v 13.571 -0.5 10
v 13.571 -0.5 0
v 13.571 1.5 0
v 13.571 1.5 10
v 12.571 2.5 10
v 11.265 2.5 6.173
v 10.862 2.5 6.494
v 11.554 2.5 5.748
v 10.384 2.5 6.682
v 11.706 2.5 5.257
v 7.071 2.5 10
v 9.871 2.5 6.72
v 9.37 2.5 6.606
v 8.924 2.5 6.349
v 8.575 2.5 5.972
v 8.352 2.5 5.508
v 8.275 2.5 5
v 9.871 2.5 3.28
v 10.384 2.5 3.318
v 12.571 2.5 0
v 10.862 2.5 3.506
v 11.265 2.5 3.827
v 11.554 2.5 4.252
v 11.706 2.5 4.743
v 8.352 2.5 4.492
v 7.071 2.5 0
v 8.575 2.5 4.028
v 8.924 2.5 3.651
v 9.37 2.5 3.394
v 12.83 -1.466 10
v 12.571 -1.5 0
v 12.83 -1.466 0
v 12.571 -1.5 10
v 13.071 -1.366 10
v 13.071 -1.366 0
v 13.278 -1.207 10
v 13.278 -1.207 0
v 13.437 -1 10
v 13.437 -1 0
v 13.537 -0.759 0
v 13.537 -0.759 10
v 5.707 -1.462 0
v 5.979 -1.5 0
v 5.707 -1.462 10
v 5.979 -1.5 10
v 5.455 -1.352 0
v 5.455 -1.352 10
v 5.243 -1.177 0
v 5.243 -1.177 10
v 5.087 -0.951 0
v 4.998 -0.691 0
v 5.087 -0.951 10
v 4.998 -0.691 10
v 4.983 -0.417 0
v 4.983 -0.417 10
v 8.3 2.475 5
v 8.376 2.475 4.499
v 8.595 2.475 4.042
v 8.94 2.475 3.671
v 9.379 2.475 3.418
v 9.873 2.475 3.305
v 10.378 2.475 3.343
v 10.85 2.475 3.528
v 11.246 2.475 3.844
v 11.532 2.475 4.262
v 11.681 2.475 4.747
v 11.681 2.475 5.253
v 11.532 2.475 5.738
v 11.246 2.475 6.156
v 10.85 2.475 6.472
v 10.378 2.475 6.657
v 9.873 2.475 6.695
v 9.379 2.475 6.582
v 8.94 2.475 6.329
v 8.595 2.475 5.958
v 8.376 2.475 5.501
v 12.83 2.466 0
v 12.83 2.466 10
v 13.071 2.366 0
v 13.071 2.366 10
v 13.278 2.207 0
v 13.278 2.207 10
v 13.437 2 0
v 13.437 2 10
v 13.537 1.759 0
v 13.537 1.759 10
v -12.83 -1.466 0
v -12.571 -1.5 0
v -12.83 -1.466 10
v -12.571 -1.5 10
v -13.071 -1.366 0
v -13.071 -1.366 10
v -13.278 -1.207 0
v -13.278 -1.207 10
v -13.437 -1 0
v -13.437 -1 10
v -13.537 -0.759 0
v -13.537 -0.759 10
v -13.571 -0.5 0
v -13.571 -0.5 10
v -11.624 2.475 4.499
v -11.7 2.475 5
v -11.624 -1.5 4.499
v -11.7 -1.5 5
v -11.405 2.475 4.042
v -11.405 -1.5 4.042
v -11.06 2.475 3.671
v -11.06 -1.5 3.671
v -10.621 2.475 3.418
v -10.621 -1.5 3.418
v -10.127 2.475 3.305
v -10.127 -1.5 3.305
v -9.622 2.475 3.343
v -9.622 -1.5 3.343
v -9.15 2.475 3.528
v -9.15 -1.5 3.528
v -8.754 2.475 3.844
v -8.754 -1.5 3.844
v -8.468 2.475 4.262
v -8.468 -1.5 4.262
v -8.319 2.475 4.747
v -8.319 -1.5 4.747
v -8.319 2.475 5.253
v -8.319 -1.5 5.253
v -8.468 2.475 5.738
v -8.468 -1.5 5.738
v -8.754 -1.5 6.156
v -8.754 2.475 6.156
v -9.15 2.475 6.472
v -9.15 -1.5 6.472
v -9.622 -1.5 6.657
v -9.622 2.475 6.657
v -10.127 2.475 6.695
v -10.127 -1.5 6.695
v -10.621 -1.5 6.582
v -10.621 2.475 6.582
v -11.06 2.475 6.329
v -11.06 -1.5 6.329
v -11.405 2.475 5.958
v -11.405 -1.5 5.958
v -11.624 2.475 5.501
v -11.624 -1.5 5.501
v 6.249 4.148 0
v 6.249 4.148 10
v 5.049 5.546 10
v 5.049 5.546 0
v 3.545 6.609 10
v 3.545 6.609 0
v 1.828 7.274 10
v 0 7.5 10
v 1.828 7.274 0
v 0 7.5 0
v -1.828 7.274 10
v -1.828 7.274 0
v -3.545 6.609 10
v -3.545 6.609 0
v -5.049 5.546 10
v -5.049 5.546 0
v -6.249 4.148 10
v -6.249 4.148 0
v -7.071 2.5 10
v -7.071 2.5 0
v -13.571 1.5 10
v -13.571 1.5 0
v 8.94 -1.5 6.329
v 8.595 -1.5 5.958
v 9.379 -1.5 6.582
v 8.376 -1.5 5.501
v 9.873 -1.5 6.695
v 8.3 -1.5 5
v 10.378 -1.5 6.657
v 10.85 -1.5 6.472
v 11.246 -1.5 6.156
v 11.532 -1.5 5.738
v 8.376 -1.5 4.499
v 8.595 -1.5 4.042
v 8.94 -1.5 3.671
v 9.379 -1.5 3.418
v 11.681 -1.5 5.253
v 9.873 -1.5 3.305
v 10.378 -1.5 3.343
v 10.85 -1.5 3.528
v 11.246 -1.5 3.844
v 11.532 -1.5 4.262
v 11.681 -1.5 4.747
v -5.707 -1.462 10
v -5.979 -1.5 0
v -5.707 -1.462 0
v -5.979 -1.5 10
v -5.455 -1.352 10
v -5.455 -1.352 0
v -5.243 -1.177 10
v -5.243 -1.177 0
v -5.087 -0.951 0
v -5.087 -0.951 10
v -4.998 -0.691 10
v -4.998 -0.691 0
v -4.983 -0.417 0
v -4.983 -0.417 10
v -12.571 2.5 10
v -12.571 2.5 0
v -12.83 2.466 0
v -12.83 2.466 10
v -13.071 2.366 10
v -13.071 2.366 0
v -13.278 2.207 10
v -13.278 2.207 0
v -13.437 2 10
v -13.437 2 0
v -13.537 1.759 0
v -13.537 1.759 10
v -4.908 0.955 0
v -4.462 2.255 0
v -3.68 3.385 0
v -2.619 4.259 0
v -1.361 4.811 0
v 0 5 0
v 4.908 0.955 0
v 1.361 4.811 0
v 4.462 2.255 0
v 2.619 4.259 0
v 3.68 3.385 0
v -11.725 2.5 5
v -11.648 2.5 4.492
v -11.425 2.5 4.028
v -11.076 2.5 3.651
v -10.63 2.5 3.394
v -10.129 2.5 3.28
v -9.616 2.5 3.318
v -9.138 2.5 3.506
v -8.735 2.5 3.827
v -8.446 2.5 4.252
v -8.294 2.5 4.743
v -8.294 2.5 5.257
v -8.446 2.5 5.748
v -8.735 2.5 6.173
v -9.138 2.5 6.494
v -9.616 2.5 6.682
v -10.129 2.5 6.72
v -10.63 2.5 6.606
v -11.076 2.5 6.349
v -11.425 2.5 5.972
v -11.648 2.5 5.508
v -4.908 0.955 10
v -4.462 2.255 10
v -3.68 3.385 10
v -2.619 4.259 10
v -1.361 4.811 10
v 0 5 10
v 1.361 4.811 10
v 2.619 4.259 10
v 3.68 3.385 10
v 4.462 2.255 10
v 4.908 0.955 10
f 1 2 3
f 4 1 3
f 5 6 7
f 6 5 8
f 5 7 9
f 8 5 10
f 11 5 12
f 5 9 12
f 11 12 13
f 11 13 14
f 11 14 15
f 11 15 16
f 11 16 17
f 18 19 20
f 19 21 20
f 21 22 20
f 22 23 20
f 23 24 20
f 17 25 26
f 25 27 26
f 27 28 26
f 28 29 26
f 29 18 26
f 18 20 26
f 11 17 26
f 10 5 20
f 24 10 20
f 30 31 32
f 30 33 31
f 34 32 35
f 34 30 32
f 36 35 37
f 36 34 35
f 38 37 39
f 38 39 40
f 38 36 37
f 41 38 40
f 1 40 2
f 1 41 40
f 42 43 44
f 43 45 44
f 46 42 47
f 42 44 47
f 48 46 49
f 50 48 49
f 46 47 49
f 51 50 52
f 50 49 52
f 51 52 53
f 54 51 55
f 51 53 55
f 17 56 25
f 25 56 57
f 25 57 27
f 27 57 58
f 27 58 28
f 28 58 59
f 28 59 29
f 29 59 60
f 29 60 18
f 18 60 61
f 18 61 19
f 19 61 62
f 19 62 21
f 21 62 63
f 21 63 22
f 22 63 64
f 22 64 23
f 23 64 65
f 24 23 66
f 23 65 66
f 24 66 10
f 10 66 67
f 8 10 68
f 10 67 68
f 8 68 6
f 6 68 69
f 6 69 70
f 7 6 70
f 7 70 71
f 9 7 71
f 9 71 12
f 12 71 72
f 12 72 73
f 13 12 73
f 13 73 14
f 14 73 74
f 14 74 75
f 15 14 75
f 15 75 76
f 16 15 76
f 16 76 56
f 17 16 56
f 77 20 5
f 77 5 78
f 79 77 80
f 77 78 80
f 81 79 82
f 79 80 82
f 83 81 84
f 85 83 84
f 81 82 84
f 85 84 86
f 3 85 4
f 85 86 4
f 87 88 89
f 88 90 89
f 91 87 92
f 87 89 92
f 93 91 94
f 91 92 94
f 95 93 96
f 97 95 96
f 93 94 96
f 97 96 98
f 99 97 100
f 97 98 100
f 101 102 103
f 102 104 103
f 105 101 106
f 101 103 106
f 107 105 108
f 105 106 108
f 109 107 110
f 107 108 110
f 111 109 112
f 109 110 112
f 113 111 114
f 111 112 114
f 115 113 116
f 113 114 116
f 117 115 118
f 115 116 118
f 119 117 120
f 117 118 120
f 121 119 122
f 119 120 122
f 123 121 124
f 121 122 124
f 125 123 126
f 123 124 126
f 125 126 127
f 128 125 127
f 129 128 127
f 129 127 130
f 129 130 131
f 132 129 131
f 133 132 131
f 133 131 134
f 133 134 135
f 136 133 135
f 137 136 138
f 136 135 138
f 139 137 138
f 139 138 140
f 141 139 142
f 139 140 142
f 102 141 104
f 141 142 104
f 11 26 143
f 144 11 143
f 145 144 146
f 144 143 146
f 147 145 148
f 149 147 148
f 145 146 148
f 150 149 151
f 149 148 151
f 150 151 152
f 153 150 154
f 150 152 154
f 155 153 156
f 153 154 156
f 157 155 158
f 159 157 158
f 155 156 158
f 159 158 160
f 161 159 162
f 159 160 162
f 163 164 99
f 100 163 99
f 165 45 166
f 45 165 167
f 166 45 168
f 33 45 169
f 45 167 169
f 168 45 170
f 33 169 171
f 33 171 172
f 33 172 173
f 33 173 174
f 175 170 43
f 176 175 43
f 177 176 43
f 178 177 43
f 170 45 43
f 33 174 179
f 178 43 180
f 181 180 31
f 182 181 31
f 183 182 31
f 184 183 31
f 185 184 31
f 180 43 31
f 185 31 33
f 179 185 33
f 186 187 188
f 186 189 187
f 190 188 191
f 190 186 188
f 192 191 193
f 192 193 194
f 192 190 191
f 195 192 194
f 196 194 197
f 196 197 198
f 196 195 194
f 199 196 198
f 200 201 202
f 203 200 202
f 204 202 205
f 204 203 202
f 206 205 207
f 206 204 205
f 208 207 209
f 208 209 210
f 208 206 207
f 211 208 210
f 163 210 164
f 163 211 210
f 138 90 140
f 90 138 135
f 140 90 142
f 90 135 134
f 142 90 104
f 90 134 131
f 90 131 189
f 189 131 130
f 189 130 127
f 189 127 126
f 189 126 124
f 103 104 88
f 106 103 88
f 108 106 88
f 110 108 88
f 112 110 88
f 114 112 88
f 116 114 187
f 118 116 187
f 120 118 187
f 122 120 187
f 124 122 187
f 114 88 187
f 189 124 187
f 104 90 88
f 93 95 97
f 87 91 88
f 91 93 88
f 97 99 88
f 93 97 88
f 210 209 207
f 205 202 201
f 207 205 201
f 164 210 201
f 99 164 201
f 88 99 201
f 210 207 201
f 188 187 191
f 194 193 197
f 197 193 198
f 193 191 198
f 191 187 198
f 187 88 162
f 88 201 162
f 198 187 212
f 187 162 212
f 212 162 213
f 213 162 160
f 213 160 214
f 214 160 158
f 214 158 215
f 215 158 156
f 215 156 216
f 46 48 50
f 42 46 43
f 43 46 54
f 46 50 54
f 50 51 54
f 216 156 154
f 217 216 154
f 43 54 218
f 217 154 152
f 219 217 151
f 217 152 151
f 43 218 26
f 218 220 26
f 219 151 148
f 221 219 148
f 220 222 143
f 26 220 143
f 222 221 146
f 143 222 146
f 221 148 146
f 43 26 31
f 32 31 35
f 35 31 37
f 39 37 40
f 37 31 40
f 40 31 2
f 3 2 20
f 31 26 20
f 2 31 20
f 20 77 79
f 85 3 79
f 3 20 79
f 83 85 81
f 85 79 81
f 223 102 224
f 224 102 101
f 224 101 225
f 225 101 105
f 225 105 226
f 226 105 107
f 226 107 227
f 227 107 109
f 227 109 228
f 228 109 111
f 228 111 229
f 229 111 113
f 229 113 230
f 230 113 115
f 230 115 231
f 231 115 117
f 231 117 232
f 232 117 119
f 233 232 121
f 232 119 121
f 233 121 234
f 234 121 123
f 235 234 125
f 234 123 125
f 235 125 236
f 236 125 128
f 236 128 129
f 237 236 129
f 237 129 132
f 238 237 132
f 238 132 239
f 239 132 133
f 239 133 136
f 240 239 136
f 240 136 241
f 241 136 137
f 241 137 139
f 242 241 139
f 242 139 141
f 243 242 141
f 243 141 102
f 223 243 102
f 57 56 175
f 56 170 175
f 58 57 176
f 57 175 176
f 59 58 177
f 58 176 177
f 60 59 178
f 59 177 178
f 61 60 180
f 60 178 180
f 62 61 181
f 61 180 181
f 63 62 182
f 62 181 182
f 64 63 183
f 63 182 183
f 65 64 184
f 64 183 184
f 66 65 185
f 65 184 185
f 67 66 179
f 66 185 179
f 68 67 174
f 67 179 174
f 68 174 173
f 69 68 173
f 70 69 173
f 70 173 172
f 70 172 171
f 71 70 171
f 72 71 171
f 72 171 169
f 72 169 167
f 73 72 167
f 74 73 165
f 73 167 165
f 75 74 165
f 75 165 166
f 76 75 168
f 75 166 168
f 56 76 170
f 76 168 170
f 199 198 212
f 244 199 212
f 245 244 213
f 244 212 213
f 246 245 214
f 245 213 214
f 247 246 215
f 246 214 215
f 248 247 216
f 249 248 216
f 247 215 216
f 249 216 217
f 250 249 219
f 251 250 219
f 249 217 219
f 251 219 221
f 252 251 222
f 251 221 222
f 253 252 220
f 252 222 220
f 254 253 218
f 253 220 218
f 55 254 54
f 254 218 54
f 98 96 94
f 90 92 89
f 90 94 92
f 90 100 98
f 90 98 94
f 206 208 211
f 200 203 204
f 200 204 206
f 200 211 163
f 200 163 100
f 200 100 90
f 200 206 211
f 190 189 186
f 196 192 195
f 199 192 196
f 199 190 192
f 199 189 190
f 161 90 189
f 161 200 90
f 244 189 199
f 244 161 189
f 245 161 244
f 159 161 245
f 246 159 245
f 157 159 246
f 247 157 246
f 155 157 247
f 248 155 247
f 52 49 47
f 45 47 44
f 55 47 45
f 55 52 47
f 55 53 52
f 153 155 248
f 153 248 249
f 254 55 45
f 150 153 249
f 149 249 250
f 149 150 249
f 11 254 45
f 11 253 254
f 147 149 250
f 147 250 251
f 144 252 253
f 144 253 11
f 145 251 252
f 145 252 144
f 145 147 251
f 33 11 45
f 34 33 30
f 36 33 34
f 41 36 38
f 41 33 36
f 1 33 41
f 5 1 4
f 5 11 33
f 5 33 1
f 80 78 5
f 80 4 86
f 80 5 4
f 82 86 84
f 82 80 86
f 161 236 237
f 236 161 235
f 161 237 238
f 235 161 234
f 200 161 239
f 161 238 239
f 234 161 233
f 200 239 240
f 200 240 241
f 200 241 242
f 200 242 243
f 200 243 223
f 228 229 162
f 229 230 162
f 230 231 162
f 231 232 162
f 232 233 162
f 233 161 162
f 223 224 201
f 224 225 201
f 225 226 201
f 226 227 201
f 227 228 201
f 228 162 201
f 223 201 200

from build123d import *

# Parameters (mm, degrees)
BOSS_EXTRUDE1_DEPTH            = 10
M3_CLEARANCE_HOLE1_D           = 3.4
M3_CLEARANCE_HOLE1_CSINK_D     = 3.45
M3_CLEARANCE_HOLE1_CSINK_ANGLE = 90
FILLET1_R                      = 1


with BuildPart() as part:
    # Sketch2 → Boss-Extrude1 (new body)
    with BuildSketch(Plane.XY):
        with BuildLine():
            Line((4.769696007, -1.5), (13.571067812, -1.5))
            Line((13.571067812, -1.5), (13.571067812, 2.5))
            Line((13.571067812, 2.5), (7.071067812, 2.5))
            ThreePointArc((7.071067812, 2.5), (0, 7.5), (-7.071067812, 2.5))
            Line((-7.071067812, 2.5), (-13.571067812, 2.5))
            Line((-13.571067812, 2.5), (-13.571067812, -1.5))
            Line((-13.571067812, -1.5), (-4.769696007, -1.5))
            ThreePointArc((-4.769696007, -1.5), (0, 5), (4.769696007, -1.5))
        make_face()
    extrude(amount=BOSS_EXTRUDE1_DEPTH)

    # M3 Clearance Hole1 (through all)
    with Locations(Plane(origin=(0, 2.5, 0), x_dir=(1, 0, 0), z_dir=(0, 1, 0))):
        with Locations((-10, -5), (10, -5)):
            CounterSinkHole(M3_CLEARANCE_HOLE1_D / 2, M3_CLEARANCE_HOLE1_CSINK_D / 2, counter_sink_angle=M3_CLEARANCE_HOLE1_CSINK_ANGLE)

    # Fillet1
    fillet1_edges = [part.edges().sort_by_distance(p)[0] for p in [
        (13.571067812, 2.5, 5),
        (13.571067812, -1.5, 5),
        (4.769696007, -1.5, 5),
        (-4.769696007, -1.5, 5),
        (-13.571067812, -1.5, 5),
        (-13.571067812, 2.5, 5),
    ]]
    fillet(fillet1_edges, radius=FILLET1_R)


solid = part.part
